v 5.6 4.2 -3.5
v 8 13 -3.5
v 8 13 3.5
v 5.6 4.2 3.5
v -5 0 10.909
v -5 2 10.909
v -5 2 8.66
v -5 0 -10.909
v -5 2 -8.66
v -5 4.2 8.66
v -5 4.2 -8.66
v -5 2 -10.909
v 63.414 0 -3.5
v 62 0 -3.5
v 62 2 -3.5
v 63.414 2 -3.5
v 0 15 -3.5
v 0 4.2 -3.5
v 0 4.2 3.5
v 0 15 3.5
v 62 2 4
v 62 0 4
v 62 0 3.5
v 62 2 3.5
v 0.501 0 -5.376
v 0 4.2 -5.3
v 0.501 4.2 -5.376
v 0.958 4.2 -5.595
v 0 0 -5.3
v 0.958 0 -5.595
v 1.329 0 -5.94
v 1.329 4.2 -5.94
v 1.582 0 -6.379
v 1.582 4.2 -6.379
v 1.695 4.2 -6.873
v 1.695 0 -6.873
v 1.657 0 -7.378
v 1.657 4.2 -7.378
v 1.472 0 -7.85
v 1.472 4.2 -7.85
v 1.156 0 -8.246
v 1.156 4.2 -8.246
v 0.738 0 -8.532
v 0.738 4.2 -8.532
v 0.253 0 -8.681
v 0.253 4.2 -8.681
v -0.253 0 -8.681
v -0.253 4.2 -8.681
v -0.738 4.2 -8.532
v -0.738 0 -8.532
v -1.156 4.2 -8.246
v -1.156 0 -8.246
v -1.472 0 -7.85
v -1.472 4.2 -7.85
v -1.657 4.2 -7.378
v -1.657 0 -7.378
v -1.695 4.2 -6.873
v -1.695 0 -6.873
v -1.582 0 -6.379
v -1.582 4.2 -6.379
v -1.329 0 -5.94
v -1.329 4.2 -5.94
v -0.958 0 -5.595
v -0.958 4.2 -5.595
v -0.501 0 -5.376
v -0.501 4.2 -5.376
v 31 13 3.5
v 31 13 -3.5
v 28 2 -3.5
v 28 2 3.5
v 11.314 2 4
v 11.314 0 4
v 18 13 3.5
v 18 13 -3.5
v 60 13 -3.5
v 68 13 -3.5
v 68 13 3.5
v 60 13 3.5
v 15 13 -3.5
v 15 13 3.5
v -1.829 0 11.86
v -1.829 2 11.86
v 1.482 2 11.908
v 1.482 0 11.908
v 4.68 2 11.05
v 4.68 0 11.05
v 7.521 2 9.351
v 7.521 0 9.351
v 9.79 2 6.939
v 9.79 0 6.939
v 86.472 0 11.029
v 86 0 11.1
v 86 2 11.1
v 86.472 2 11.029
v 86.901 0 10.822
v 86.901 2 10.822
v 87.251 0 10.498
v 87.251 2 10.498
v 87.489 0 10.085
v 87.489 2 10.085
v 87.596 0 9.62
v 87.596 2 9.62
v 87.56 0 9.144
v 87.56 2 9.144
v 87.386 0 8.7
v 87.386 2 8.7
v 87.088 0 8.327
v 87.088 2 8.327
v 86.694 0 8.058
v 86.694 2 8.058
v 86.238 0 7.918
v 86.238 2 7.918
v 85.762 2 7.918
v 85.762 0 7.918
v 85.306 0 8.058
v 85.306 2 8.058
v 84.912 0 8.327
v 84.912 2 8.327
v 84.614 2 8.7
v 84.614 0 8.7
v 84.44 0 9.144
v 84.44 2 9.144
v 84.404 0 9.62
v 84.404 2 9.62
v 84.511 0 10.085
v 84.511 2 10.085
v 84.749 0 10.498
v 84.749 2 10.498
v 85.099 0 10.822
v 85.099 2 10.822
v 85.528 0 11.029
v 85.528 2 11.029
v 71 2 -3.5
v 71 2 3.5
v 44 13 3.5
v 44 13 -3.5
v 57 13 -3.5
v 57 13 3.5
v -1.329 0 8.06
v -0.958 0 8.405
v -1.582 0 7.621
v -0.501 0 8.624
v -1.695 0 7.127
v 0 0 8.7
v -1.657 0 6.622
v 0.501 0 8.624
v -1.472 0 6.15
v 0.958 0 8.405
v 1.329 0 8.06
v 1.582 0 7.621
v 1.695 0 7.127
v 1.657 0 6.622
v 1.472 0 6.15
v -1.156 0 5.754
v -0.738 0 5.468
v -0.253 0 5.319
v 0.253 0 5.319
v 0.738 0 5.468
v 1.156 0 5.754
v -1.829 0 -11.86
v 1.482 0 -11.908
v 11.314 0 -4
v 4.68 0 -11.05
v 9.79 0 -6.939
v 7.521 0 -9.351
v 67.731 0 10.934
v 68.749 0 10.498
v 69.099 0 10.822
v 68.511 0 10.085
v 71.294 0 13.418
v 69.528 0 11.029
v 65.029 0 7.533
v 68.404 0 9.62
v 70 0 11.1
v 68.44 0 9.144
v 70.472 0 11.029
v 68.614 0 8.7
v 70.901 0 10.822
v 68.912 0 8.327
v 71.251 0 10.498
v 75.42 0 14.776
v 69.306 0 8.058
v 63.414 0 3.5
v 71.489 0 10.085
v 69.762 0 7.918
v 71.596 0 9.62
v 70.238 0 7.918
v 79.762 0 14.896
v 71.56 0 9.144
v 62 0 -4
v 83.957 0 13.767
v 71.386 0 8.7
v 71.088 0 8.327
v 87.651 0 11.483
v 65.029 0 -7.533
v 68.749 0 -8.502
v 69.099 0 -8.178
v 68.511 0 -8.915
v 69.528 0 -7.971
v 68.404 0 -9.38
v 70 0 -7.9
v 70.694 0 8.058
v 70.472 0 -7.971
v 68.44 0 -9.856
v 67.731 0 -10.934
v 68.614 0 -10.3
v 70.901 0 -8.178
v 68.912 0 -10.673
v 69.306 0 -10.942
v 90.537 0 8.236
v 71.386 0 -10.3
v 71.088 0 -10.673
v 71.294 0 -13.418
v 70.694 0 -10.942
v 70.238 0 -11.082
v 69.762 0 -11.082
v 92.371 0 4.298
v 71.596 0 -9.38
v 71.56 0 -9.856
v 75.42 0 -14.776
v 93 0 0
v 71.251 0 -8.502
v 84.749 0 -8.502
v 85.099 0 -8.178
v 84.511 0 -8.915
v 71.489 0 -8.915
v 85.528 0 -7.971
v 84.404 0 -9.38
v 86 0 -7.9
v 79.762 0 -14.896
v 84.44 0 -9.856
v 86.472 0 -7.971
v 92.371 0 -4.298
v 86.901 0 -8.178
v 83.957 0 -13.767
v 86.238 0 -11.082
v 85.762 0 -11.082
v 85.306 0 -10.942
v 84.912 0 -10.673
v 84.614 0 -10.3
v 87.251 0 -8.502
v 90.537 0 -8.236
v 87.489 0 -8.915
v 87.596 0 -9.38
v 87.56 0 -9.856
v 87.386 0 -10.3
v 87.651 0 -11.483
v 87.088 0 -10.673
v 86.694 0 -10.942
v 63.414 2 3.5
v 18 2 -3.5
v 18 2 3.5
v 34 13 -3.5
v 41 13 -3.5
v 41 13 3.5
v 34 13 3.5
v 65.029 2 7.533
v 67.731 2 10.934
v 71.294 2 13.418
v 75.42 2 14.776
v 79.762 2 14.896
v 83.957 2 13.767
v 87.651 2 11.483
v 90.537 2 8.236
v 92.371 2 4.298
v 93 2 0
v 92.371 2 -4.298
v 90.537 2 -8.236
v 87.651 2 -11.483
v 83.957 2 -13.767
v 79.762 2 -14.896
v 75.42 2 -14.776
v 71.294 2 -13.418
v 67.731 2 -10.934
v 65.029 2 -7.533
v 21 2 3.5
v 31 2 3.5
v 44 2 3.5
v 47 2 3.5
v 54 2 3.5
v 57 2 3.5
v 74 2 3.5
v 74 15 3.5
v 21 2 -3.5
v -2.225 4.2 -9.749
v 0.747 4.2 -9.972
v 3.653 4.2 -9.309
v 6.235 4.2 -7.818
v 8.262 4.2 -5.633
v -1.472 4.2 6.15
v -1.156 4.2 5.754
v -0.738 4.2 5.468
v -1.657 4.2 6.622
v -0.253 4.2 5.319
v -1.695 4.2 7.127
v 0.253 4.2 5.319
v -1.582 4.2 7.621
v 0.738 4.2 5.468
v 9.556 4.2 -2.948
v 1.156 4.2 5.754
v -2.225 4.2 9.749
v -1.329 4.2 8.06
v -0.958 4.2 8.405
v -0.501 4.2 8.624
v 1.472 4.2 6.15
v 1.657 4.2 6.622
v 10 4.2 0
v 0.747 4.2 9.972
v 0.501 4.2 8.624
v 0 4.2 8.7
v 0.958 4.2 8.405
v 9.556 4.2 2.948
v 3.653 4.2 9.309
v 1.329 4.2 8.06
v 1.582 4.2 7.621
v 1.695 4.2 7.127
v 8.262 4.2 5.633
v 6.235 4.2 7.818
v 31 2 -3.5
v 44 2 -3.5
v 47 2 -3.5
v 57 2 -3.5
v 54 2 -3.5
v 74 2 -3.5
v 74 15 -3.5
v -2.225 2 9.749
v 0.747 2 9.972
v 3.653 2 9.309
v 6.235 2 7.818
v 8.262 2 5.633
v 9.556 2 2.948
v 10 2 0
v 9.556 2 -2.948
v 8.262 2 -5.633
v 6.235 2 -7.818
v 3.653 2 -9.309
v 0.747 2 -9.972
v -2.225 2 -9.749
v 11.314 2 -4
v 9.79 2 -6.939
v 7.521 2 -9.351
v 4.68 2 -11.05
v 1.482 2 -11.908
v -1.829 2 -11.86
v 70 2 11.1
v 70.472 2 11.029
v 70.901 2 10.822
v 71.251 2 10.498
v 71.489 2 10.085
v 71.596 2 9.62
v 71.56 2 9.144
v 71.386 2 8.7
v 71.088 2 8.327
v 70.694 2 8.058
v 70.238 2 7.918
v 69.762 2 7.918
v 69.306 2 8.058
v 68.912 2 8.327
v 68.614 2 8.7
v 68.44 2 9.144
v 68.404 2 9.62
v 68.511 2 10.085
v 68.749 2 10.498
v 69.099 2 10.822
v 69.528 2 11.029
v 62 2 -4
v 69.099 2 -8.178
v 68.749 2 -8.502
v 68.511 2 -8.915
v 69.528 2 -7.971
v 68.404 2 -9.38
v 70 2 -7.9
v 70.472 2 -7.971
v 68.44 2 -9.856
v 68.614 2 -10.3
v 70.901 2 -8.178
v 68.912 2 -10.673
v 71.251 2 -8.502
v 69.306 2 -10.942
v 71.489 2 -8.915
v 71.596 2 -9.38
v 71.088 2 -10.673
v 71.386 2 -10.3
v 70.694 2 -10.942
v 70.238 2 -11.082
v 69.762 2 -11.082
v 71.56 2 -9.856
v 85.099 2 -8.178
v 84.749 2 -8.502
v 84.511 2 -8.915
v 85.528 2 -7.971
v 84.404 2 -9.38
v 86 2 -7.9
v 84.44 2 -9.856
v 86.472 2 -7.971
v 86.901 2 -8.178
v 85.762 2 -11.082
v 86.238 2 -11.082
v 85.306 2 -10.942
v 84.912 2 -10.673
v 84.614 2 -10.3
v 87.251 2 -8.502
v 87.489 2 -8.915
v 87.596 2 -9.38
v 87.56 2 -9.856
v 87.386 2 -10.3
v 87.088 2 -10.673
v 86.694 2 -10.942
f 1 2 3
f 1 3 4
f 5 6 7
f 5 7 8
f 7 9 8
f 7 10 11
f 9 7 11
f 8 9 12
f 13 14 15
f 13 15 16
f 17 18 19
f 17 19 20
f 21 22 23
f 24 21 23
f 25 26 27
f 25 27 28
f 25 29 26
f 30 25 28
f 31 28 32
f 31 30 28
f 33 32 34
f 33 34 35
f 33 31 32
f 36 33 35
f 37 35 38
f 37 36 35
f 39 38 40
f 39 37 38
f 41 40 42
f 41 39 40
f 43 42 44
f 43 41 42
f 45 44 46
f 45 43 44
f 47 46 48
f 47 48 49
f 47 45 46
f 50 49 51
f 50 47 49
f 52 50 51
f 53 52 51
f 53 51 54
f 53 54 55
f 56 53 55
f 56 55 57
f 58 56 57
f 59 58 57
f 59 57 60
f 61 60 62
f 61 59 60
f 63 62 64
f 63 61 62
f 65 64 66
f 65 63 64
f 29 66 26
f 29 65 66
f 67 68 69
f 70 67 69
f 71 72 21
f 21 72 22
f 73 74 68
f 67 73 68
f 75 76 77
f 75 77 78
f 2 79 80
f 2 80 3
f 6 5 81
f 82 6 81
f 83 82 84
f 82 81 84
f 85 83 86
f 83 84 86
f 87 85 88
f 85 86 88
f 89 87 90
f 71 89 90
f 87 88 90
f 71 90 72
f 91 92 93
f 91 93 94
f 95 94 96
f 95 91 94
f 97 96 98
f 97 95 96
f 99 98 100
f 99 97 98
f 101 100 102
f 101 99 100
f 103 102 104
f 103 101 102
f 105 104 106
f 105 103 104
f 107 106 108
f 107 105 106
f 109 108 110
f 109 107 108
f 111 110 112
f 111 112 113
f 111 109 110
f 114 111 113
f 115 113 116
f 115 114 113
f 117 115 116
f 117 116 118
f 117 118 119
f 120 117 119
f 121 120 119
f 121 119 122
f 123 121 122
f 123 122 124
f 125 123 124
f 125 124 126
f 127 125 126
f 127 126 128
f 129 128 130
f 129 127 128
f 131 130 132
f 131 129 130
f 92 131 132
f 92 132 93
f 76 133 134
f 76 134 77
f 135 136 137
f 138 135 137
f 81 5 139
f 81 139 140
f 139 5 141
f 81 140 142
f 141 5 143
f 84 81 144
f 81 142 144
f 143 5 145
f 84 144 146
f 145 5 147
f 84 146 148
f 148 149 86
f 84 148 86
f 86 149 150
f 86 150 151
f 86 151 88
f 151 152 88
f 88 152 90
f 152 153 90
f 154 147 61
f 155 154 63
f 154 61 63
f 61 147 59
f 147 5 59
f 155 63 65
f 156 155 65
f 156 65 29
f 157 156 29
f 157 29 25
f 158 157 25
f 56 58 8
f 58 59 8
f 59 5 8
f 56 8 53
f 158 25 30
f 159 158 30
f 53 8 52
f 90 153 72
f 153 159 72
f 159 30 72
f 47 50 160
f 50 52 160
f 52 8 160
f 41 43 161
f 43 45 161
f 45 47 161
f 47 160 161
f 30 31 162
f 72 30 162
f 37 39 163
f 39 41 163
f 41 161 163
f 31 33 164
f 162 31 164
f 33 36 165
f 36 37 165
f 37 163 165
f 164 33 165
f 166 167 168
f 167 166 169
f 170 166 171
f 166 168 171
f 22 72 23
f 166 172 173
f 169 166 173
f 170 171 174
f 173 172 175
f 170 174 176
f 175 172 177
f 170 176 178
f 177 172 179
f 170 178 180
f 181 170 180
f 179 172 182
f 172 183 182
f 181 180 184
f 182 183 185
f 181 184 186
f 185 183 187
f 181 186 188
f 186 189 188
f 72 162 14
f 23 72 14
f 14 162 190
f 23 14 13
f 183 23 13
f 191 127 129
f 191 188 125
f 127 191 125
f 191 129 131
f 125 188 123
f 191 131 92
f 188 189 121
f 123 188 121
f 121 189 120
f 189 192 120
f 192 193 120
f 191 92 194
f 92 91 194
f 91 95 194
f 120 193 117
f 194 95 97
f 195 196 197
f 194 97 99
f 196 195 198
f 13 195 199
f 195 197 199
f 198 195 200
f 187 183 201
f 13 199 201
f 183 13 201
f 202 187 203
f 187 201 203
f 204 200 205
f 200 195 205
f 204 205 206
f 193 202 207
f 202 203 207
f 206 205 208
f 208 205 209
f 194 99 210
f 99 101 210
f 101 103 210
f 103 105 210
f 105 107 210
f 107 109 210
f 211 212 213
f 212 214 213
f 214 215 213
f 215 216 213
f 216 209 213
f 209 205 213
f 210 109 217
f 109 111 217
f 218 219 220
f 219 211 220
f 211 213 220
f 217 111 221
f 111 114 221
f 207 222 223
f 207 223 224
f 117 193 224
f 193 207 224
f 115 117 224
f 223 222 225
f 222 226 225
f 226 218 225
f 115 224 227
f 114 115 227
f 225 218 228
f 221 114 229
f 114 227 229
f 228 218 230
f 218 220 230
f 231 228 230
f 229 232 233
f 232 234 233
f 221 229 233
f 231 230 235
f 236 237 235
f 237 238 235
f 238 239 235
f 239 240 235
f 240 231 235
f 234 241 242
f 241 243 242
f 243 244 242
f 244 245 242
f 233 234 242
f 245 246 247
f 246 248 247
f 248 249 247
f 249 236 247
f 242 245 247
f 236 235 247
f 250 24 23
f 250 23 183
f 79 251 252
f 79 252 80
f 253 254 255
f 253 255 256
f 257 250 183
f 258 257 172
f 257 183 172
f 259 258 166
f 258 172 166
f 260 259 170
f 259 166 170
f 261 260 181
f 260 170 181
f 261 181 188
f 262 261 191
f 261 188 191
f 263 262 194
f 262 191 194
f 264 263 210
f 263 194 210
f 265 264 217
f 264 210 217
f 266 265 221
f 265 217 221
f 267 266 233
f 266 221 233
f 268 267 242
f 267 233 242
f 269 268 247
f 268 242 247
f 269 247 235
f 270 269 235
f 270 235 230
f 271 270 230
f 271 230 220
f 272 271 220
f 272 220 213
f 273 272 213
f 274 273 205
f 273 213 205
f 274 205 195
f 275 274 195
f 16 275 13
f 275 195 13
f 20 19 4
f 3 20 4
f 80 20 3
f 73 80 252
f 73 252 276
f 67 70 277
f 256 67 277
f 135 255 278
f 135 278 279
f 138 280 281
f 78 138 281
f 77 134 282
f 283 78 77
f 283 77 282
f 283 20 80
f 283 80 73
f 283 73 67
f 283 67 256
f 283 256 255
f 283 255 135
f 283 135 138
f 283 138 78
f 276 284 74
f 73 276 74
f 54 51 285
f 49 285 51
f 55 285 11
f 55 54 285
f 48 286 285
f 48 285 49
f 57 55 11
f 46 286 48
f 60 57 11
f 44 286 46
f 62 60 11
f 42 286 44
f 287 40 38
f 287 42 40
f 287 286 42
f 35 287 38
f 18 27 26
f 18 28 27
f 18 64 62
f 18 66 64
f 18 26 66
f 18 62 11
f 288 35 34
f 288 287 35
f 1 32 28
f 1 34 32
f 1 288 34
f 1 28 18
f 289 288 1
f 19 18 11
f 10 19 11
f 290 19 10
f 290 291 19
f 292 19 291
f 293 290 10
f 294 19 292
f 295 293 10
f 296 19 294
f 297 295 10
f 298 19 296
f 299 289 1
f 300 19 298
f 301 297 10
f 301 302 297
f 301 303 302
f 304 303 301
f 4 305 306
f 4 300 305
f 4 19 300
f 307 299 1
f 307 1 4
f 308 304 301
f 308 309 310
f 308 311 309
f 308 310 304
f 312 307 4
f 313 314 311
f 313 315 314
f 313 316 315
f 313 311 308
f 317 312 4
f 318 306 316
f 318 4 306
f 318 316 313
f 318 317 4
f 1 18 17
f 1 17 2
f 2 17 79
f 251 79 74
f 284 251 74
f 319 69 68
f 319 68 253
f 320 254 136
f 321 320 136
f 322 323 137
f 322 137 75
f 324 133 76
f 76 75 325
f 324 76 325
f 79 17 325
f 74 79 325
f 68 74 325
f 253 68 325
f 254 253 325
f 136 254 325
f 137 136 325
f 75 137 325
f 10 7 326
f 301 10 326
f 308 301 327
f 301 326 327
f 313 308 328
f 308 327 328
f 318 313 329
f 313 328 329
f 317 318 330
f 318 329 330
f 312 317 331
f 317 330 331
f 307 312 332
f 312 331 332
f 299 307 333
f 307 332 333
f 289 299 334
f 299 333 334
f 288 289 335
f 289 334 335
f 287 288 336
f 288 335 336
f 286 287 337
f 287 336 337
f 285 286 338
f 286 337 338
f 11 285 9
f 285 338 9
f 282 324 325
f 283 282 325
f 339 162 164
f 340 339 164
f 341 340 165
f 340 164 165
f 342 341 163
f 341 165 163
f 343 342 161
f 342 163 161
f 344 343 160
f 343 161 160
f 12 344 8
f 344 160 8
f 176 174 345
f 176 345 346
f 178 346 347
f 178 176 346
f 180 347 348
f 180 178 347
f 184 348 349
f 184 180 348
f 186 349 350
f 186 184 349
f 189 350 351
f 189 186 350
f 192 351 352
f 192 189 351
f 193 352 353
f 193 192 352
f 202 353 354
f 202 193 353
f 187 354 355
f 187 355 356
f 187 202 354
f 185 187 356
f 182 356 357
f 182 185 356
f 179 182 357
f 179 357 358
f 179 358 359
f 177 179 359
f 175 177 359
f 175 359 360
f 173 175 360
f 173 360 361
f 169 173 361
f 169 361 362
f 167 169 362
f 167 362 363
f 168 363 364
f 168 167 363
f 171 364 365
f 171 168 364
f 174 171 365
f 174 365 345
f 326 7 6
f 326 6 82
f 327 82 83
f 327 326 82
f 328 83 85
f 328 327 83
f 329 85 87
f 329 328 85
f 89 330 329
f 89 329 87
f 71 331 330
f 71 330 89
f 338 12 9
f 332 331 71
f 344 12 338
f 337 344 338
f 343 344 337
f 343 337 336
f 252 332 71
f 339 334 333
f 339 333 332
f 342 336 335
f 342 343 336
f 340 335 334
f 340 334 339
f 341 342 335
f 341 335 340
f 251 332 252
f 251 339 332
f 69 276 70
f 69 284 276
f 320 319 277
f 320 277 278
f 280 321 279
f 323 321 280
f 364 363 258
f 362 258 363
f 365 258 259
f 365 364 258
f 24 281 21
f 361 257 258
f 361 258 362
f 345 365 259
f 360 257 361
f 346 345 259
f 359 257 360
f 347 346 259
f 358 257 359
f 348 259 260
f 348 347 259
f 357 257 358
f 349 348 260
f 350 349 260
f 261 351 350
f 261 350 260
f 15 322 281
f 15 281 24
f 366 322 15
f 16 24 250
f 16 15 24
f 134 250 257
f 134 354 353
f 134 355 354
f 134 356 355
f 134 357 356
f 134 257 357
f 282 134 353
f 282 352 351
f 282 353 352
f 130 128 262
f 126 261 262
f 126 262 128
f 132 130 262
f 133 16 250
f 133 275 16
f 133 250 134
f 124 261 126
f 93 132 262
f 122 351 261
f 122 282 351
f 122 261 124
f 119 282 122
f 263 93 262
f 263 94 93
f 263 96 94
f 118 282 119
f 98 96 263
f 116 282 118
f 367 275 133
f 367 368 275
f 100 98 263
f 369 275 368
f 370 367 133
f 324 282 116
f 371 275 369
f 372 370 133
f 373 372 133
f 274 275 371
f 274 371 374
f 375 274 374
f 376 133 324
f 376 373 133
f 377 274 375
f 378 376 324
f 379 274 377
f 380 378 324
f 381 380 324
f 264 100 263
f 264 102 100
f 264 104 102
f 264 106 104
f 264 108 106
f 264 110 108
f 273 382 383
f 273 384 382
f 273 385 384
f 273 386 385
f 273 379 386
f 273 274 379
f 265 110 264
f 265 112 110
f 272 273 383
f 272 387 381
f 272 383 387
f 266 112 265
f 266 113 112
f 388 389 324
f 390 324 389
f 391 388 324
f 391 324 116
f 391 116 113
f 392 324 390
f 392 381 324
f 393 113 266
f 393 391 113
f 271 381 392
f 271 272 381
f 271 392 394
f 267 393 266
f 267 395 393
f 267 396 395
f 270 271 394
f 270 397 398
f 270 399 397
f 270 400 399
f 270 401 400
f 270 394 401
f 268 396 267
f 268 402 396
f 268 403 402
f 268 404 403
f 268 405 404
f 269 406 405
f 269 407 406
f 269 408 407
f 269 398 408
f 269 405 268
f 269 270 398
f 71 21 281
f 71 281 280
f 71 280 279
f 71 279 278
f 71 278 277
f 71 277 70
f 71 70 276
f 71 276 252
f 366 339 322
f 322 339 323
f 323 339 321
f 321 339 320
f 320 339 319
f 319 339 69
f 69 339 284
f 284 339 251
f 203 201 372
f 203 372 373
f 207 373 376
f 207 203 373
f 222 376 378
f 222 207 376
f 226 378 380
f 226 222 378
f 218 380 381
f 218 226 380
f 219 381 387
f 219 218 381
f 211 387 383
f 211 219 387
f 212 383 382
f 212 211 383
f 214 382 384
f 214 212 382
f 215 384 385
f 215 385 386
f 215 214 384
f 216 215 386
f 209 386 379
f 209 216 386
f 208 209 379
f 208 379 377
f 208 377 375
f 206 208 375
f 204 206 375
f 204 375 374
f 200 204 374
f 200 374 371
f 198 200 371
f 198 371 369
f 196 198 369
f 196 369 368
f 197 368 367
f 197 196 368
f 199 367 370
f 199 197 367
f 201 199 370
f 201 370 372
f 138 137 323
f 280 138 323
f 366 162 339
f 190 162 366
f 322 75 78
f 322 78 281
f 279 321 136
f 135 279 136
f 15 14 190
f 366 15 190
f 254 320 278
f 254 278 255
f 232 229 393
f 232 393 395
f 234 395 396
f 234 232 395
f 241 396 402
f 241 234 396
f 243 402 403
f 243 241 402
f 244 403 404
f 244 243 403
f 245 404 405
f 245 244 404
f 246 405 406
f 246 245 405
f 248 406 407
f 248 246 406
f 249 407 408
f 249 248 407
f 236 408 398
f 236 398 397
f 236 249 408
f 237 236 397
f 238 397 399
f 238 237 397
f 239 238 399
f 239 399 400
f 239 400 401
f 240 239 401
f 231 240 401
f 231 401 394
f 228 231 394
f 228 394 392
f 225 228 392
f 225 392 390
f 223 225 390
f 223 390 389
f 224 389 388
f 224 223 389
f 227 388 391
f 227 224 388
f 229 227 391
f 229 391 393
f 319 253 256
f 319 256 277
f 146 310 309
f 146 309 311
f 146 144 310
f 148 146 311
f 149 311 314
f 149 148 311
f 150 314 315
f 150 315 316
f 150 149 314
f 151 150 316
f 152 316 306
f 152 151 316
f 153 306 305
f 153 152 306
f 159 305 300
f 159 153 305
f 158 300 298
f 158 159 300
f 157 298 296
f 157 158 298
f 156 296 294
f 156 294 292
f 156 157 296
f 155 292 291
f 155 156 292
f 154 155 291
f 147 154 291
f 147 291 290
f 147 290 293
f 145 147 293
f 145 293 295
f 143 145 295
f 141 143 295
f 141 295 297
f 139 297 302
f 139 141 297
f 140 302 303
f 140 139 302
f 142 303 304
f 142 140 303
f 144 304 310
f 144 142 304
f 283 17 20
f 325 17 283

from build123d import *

# Parameters (mm, degrees)
SKETCH_1_W          = 62
SKETCH_1_H          = 8
EXTRUDE_1_DEPTH     = 2
SKETCH_2_R          = 12
SKETCH_2_R_2        = 1.7
EXTRUDE_2_DEPTH     = 2
EXTRUDE_START       = 2
SKETCH_3_R          = 10
SKETCH_3_R_2        = 1.7
EXTRUDE_3_DEPTH     = 2.2
EXTRUDE_START_2     = 13
SKETCH_4_W          = 20
SKETCH_4_H          = 7
EXTRUDE_4_DEPTH     = 2
SKETCH_5_R          = 15
SKETCH_5_R_2        = 1.6
EXTRUDE_5_DEPTH     = 2
EXTRUDE_START_3     = -3.5
SKETCH_6_W          = 74
SKETCH_6_H          = 15
EXTRUDE_6_DEPTH     = 7
SKETCH_7_W          = 13.866896788
SKETCH_7_H          = 9.192033752
CUT_EXTRUDE_1_DEPTH = 10
SKETCH_8_W          = 10
SKETCH_8_H          = 24
CUT_EXTRUDE_2_DEPTH = 10


with BuildPart() as part:
    # 草图1 → 凸台-拉伸1 (new body)
    with BuildSketch(Plane(origin=(0, 0, 0), x_dir=(1, 0, 0), z_dir=(0, 1, 0))):
        with Locations((31, 0)):
            Rectangle(SKETCH_1_W, SKETCH_1_H)
    extrude(amount=EXTRUDE_1_DEPTH)

    # 草图2 → 凸台-拉伸2 (add)
    with BuildSketch(Plane(origin=(0, 0, 0), x_dir=(1, 0, 0), z_dir=(0, 1, 0))):
        Circle(SKETCH_2_R)
        with Locations(Location((0, -7, 0), (0, 0, 270))):
            Circle(SKETCH_2_R_2, mode=Mode.SUBTRACT)
        with Locations(Location((0, 7, 0), (0, 0, 270))):
            Circle(SKETCH_2_R_2, mode=Mode.SUBTRACT)
    extrude(amount=EXTRUDE_2_DEPTH)

    # 草图3 → 凸台-拉伸3 (add)
    with BuildSketch(Plane(origin=(0, 0, 0), x_dir=(1, 0, 0), z_dir=(0, 1, 0)).offset(EXTRUDE_START)):
        with Locations(Location((0, 0, 0), (0, 0, 270))):
            Circle(SKETCH_3_R)
        with Locations(Location((0, -7, 0), (0, 0, 270))):
            Circle(SKETCH_3_R_2, mode=Mode.SUBTRACT)
        with Locations(Location((0, 7, 0), (0, 0, 270))):
            Circle(SKETCH_3_R_2, mode=Mode.SUBTRACT)
    extrude(amount=EXTRUDE_3_DEPTH)



with BuildPart() as body_2:
    # 草图4 → 凸台-拉伸4 (new body)
    with BuildSketch(Plane(origin=(0, 0, 0), x_dir=(1, 0, 0), z_dir=(0, 1, 0)).offset(EXTRUDE_START_2)):
        Rectangle(SKETCH_4_W, SKETCH_4_H)
    extrude(amount=EXTRUDE_4_DEPTH)


with BuildPart() as body_3:
    # 草图5 → 凸台-拉伸5 (new body)
    with BuildSketch(Plane(origin=(0, 0, 0), x_dir=(1, 0, 0), z_dir=(0, 1, 0))):
        with Locations(Location((78, 0, 0), (0, 0, 270))):
            Circle(SKETCH_5_R)
        with Locations(Location((70, -9.5, 0), (0, 0, 270))):
            Circle(SKETCH_5_R_2, mode=Mode.SUBTRACT)
        with Locations(Location((70, 9.5, 0), (0, 0, 270))):
            Circle(SKETCH_5_R_2, mode=Mode.SUBTRACT)
        with Locations(Location((86, -9.5, 0), (0, 0, 270))):
            Circle(SKETCH_5_R_2, mode=Mode.SUBTRACT)
        with Locations(Location((86, 9.5, 0), (0, 0, 270))):
            Circle(SKETCH_5_R_2, mode=Mode.SUBTRACT)
    extrude(amount=EXTRUDE_5_DEPTH)


with BuildPart() as part_1:
    add(part.part)

    add(body_2.part)  # 凸台-拉伸6 merges body 2

    add(body_3.part)  # 凸台-拉伸6 merges body 3
    # 草图6 → 凸台-拉伸6 (add)
    with BuildSketch(Plane.XY.offset(EXTRUDE_START_3)):
        with Locations((37, 7.5)):
            Rectangle(SKETCH_6_W, SKETCH_6_H)
        Polygon((5, 2), (18, 2), (15, 13), (8, 13), align=None, mode=Mode.SUBTRACT)
        Polygon((18, 13), (31, 13), (28, 2), (21, 2), align=None, mode=Mode.SUBTRACT)
        Polygon((31, 2), (44, 2), (41, 13), (34, 13), align=None, mode=Mode.SUBTRACT)
        Polygon((44, 13), (57, 13), (54, 2), (47, 2), align=None, mode=Mode.SUBTRACT)
        Polygon((57, 2), (71, 2), (68, 13), (60, 13), align=None, mode=Mode.SUBTRACT)
    extrude(amount=EXTRUDE_6_DEPTH)

    # 草图7 → 切除-拉伸1 (cut)
    with BuildSketch(Plane.XZ.offset(-13)):
        with Locations((-6.933448394, 0.107084937)):
            Rectangle(SKETCH_7_W, SKETCH_7_H)
    extrude(amount=-CUT_EXTRUDE_1_DEPTH, mode=Mode.SUBTRACT)

    # 草图8 → 切除-拉伸2 (cut)
    with BuildSketch(Plane(origin=(0, 4.2, 0), x_dir=(1, 0, 0), z_dir=(0, 1, 0))):
        with Locations((-10, 0)):
            Rectangle(SKETCH_8_W, SKETCH_8_H)
    extrude(amount=-CUT_EXTRUDE_2_DEPTH, mode=Mode.SUBTRACT)


solid = part_1.part
